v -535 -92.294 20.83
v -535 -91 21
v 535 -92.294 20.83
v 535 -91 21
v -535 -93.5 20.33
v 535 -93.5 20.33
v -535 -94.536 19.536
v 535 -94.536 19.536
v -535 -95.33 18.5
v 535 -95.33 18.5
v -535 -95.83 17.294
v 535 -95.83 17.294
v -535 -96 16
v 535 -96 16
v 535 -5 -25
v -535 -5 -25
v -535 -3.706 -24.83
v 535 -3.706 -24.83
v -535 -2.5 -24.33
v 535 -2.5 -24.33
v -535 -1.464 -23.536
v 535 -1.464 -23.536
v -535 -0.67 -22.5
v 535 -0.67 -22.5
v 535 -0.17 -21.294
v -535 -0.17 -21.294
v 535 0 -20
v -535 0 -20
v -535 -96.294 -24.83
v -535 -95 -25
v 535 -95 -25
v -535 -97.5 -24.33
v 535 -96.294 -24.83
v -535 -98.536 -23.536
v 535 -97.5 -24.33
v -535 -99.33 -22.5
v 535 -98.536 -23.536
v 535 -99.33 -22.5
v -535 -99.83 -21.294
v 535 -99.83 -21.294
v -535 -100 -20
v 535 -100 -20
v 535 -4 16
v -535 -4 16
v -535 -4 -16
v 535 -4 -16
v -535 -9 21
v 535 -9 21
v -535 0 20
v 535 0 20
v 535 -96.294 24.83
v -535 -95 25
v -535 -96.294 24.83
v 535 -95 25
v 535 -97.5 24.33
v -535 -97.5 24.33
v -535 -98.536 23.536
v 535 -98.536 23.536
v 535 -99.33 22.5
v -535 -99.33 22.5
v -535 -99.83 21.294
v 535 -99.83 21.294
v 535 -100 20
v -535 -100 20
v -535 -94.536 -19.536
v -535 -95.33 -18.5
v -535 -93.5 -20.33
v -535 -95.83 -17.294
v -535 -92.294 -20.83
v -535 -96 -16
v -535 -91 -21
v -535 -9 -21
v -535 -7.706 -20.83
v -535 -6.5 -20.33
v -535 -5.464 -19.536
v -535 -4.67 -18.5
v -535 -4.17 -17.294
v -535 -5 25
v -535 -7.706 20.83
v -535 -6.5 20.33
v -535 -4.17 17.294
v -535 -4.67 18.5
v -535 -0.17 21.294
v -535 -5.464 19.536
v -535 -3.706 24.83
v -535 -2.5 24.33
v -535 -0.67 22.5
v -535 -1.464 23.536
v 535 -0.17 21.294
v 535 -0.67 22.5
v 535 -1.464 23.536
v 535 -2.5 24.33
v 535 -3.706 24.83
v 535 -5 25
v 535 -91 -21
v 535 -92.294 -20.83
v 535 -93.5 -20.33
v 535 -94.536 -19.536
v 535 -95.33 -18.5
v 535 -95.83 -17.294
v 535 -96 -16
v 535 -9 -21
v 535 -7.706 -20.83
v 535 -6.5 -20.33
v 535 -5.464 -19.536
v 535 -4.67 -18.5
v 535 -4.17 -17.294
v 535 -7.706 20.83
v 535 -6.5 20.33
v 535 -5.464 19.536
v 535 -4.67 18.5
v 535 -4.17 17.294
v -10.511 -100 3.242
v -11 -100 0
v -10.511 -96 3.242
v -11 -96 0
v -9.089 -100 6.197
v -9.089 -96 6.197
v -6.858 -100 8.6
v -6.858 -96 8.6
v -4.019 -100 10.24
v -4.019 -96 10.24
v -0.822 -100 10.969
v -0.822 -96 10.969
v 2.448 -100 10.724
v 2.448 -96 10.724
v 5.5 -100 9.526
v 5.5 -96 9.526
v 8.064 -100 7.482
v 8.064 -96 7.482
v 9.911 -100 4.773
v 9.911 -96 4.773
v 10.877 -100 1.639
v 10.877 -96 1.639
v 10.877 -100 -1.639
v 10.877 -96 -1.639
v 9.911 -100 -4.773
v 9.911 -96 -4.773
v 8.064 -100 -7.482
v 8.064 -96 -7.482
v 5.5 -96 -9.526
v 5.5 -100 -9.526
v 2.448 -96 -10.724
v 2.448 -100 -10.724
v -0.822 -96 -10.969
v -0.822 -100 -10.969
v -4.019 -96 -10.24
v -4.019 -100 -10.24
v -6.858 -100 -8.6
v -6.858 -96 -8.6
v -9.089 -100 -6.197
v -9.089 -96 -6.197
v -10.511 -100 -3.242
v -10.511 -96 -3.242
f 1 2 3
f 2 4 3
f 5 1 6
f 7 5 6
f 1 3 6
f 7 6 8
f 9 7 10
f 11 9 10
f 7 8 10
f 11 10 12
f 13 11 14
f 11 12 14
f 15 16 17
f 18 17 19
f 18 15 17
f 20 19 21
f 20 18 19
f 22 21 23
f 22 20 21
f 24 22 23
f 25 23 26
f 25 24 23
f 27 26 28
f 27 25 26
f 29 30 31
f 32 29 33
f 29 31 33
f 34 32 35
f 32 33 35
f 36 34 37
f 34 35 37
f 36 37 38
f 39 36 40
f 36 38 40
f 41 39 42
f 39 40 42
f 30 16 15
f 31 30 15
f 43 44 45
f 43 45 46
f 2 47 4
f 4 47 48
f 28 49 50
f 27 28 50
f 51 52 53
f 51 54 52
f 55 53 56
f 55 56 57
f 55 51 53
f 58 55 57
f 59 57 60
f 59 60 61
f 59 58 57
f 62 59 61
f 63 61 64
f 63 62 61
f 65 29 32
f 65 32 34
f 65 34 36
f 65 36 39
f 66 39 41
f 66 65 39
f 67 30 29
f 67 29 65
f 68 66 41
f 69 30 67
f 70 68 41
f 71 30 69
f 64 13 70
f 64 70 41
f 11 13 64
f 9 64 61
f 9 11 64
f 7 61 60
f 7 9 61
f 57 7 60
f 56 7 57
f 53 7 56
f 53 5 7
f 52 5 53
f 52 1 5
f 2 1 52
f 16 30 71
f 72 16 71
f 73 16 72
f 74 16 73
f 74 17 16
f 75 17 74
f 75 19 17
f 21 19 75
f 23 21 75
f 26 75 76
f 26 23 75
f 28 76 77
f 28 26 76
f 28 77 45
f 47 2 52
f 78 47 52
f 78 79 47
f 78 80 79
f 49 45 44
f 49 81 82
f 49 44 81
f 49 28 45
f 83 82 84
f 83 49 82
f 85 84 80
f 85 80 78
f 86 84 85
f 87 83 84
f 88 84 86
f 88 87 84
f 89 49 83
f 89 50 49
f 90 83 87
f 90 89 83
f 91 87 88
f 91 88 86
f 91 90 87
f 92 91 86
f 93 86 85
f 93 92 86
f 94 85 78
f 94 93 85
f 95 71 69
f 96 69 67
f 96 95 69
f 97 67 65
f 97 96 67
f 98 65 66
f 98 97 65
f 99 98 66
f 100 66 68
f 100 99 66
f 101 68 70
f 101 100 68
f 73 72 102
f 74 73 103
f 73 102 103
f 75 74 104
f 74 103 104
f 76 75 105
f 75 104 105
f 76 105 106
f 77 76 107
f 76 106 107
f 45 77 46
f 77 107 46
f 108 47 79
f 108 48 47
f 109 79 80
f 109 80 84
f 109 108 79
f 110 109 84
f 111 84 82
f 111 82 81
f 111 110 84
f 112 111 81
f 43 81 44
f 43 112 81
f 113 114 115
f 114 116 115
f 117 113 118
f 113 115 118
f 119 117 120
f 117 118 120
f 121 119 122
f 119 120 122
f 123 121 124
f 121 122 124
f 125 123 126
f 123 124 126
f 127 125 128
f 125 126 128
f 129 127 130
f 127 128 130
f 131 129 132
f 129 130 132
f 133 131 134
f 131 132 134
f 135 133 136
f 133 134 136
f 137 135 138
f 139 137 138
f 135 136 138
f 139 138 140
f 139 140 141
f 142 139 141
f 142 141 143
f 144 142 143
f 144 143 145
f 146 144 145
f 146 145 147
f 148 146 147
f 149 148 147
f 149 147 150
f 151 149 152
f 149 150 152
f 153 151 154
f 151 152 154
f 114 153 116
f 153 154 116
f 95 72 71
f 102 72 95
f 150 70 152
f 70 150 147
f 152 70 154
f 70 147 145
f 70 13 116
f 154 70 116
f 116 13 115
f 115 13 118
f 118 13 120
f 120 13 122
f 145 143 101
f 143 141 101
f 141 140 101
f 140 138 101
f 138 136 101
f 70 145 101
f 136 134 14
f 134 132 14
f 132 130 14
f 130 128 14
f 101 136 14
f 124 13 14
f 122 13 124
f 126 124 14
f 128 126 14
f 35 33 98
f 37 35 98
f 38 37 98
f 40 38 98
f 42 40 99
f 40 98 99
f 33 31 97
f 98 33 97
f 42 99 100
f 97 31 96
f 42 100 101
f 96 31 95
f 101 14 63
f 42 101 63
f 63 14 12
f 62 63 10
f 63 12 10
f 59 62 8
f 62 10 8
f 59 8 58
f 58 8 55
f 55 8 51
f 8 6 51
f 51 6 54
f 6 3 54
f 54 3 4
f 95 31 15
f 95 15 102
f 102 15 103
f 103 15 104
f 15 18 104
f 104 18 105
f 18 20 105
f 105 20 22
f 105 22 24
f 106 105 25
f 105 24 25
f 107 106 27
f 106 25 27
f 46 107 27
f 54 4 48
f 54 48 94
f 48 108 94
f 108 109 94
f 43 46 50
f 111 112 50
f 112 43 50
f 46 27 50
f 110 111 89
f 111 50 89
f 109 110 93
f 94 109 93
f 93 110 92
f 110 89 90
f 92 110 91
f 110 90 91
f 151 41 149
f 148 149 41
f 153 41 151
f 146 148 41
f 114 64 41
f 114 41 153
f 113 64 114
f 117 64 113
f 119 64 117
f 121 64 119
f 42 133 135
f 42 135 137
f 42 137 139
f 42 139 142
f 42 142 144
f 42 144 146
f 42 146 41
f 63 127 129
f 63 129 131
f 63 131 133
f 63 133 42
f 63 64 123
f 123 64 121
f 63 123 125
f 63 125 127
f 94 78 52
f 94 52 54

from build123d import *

# Parameters (mm, degrees)
F0_W     = 1070
F0_H     = 50
F1_DEPTH = 100
F2_T     = -4
F3_R     = 5
F5_D     = 22
F5_DEPTH = 4
F5_TIP   = 6.6094668093


with BuildPart() as f1:
    # F0 (on Front) → F1 (new body)
    with BuildSketch(Plane.XZ):
        Rectangle(F0_W, F0_H)
    extrude(amount=F1_DEPTH)

    # F2
    f2_openings = [f1.faces().sort_by_distance(p)[0] for p in [
        (-535, -50, 0),
        (535, -50, 0),
    ]]
    offset(amount=F2_T, openings=f2_openings)

    # F3
    f3_edges = [f1.edges().sort_by_distance(p)[0] for p in [
        (0, -96, -21),
        (0, -96, 21),
        (0, -4, -21),
        (0, -4, 21),
        (0, 0, 25),
        (0, 0, -25),
        (0, -100, 25),
        (0, -100, -25),
    ]]
    fillet(f3_edges, radius=F3_R)

    # F5
    with Locations(Plane.XZ.offset(100)):
        with Locations((0, 0)):
            Hole(F5_D / 2, depth=F5_DEPTH)
            with Locations((0, 0, -(F5_DEPTH + F5_TIP / 2))):  # 118° drill point
                Cone(0, F5_D / 2, F5_TIP, mode=Mode.SUBTRACT)


solid = f1.part
